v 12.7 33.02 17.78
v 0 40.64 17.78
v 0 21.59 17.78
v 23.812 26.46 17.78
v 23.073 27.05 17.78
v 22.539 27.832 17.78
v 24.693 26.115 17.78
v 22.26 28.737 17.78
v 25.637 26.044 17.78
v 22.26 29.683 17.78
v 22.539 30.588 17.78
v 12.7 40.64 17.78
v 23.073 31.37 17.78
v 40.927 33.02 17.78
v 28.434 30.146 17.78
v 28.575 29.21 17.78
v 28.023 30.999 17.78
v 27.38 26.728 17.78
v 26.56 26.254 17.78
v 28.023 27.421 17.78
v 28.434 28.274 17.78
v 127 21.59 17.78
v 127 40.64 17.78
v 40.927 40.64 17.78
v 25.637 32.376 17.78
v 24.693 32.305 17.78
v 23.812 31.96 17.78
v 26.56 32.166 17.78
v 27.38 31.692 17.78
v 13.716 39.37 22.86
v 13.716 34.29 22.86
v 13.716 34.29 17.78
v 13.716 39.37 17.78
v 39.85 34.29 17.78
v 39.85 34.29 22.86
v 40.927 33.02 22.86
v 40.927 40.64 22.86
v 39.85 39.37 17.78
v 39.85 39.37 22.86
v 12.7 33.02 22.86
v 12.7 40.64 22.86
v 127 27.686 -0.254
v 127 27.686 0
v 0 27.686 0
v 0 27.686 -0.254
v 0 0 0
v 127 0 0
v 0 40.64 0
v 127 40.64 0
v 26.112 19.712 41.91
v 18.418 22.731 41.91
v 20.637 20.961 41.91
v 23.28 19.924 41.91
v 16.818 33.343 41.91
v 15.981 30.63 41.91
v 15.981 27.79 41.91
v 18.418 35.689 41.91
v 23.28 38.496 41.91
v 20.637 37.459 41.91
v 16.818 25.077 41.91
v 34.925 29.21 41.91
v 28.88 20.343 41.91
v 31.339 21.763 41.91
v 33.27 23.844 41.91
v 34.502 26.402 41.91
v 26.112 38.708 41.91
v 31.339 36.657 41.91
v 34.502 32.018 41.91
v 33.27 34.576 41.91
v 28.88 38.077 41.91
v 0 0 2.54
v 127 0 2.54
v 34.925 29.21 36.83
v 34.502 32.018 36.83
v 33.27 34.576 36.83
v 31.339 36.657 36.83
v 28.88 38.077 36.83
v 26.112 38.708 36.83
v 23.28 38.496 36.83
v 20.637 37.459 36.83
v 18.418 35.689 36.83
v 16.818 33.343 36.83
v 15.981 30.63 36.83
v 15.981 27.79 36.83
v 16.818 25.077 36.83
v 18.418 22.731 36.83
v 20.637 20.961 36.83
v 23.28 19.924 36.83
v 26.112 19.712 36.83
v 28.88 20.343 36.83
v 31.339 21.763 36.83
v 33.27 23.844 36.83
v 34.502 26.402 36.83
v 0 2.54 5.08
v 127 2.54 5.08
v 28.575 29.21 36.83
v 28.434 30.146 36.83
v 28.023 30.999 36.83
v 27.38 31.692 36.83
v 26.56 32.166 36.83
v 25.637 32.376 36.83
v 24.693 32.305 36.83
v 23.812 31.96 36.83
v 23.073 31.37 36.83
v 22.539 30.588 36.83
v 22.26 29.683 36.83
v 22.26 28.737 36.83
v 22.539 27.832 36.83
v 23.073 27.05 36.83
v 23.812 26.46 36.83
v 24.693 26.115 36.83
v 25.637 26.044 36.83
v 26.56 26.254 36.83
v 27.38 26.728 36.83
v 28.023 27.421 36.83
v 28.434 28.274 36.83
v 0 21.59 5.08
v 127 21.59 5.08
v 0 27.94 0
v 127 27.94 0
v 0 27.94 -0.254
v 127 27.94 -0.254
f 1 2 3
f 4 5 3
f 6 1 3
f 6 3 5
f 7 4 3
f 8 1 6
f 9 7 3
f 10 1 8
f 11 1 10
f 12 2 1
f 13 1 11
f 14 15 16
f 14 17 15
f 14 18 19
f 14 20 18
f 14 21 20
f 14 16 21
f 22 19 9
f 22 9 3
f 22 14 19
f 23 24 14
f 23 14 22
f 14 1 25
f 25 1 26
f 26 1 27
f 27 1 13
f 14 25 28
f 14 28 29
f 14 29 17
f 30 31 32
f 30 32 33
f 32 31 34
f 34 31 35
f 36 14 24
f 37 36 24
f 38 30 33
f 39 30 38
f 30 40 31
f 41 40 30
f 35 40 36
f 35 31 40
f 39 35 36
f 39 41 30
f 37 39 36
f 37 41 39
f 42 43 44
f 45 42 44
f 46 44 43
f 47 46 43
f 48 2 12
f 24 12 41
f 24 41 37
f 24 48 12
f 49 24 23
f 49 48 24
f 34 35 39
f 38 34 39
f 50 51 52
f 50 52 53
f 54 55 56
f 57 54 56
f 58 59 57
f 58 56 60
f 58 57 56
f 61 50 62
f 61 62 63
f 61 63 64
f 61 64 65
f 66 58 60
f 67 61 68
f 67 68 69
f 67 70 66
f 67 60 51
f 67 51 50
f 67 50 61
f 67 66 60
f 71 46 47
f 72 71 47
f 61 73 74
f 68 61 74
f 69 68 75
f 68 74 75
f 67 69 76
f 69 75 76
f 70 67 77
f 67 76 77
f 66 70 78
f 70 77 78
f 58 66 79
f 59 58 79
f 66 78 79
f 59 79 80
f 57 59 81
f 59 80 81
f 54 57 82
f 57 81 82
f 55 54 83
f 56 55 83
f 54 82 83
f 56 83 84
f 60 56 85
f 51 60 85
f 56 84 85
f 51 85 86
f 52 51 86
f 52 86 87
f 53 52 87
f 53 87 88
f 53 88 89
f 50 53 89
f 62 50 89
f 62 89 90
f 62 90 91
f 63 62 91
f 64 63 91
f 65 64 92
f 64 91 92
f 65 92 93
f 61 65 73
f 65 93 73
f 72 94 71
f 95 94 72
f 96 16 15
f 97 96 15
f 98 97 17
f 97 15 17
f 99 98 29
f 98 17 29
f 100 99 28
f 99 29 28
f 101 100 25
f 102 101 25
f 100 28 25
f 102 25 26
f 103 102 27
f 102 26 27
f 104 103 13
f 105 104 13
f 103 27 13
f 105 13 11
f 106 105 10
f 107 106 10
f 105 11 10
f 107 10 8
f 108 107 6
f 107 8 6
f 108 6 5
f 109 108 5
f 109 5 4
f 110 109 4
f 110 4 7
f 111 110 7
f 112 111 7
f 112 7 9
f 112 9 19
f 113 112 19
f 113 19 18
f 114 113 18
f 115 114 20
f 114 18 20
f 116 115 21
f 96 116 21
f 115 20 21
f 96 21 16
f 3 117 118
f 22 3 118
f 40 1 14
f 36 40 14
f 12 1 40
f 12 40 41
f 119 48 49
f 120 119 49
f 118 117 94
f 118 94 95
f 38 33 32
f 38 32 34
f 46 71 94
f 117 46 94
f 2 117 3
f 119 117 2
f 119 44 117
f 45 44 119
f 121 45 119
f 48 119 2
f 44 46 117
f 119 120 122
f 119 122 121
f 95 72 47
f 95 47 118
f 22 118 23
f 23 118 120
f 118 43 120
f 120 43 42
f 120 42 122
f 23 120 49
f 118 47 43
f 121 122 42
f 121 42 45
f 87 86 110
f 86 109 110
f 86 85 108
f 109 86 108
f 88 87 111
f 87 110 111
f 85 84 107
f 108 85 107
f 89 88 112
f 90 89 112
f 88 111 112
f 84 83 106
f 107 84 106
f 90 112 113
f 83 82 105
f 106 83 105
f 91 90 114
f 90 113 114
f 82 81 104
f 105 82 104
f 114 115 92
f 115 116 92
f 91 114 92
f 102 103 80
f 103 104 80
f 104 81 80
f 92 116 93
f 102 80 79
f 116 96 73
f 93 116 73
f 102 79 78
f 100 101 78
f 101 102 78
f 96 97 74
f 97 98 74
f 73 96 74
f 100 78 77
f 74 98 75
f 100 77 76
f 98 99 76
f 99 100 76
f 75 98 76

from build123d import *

# Parameters (mm, degrees)
SKETCH1_W            = 127
SKETCH1_H            = 40.64
BOSS_EXTRUDE1_DEPTH  = 5.08
CHAMFER3_SIZE        = 2.54
SKETCH6_W            = 127
SKETCH6_H            = 19.05
BOSS_EXTRUDE4_DEPTH  = 12.7
SKETCH14_R           = 3.175
BOSS_EXTRUDE9_DEPTH  = 19.05
SKETCH15_R           = 9.525
BOSS_EXTRUDE10_DEPTH = 5.08
SKETCH16_W           = 28.22730188
SKETCH16_H           = 7.62
BOSS_EXTRUDE11_DEPTH = 5.08
SKETCH17_W           = 26.13431135
SKETCH17_H           = 5.08
CUT_EXTRUDE4_DEPTH   = 5.08
SKETCH18_W           = 127
SKETCH18_H           = 0.254
BOSS_EXTRUDE12_DEPTH = 0.254


with BuildPart() as part:
    # Sketch1 → Boss-Extrude1 (new body)
    with BuildSketch(Plane.XY):
        with Locations((63.5, 20.32)):
            Rectangle(SKETCH1_W, SKETCH1_H)
    extrude(amount=BOSS_EXTRUDE1_DEPTH)

    # Chamfer3
    chamfer3_edges = [part.edges().sort_by_distance(p)[0] for p in [
        (63.5, 0, 5.08),
    ]]
    chamfer(chamfer3_edges, length=CHAMFER3_SIZE)

    # Sketch6 → Boss-Extrude4 (add)
    with BuildSketch(Plane.XY.offset(5.08)):
        with Locations((63.5, 31.115)):
            Rectangle(SKETCH6_W, SKETCH6_H)
    extrude(amount=BOSS_EXTRUDE4_DEPTH)

    # Sketch14 → Boss-Extrude9 (add)
    with BuildSketch(Plane.XY.offset(17.78)):
        with Locations((25.4, 29.21)):
            Circle(SKETCH14_R)
    extrude(amount=BOSS_EXTRUDE9_DEPTH)

    # Sketch15 → Boss-Extrude10 (add)
    with BuildSketch(Plane.XY.offset(36.83)):
        with Locations((25.4, 29.21)):
            Circle(SKETCH15_R)
    extrude(amount=BOSS_EXTRUDE10_DEPTH)

    # Sketch16 → Boss-Extrude11 (add)
    with BuildSketch(Plane.XY.offset(17.78)):
        with Locations((26.81365094, 36.83)):
            Rectangle(SKETCH16_W, SKETCH16_H)
    extrude(amount=BOSS_EXTRUDE11_DEPTH)

    # Sketch17 → Cut-Extrude4 (cut)
    with BuildSketch(Plane.XY.offset(22.86)):
        with Locations((26.783155675, 36.83)):
            Rectangle(SKETCH17_W, SKETCH17_H)
    extrude(amount=-CUT_EXTRUDE4_DEPTH, mode=Mode.SUBTRACT)

    # Sketch18 → Boss-Extrude12 (add)
    with BuildSketch(Plane(origin=(0, 0, 0), x_dir=(-1, 0, 0), z_dir=(0, 0, -1))):
        with Locations((-63.5, 27.813)):
            Rectangle(SKETCH18_W, SKETCH18_H)
    extrude(amount=BOSS_EXTRUDE12_DEPTH)


solid = part.part
